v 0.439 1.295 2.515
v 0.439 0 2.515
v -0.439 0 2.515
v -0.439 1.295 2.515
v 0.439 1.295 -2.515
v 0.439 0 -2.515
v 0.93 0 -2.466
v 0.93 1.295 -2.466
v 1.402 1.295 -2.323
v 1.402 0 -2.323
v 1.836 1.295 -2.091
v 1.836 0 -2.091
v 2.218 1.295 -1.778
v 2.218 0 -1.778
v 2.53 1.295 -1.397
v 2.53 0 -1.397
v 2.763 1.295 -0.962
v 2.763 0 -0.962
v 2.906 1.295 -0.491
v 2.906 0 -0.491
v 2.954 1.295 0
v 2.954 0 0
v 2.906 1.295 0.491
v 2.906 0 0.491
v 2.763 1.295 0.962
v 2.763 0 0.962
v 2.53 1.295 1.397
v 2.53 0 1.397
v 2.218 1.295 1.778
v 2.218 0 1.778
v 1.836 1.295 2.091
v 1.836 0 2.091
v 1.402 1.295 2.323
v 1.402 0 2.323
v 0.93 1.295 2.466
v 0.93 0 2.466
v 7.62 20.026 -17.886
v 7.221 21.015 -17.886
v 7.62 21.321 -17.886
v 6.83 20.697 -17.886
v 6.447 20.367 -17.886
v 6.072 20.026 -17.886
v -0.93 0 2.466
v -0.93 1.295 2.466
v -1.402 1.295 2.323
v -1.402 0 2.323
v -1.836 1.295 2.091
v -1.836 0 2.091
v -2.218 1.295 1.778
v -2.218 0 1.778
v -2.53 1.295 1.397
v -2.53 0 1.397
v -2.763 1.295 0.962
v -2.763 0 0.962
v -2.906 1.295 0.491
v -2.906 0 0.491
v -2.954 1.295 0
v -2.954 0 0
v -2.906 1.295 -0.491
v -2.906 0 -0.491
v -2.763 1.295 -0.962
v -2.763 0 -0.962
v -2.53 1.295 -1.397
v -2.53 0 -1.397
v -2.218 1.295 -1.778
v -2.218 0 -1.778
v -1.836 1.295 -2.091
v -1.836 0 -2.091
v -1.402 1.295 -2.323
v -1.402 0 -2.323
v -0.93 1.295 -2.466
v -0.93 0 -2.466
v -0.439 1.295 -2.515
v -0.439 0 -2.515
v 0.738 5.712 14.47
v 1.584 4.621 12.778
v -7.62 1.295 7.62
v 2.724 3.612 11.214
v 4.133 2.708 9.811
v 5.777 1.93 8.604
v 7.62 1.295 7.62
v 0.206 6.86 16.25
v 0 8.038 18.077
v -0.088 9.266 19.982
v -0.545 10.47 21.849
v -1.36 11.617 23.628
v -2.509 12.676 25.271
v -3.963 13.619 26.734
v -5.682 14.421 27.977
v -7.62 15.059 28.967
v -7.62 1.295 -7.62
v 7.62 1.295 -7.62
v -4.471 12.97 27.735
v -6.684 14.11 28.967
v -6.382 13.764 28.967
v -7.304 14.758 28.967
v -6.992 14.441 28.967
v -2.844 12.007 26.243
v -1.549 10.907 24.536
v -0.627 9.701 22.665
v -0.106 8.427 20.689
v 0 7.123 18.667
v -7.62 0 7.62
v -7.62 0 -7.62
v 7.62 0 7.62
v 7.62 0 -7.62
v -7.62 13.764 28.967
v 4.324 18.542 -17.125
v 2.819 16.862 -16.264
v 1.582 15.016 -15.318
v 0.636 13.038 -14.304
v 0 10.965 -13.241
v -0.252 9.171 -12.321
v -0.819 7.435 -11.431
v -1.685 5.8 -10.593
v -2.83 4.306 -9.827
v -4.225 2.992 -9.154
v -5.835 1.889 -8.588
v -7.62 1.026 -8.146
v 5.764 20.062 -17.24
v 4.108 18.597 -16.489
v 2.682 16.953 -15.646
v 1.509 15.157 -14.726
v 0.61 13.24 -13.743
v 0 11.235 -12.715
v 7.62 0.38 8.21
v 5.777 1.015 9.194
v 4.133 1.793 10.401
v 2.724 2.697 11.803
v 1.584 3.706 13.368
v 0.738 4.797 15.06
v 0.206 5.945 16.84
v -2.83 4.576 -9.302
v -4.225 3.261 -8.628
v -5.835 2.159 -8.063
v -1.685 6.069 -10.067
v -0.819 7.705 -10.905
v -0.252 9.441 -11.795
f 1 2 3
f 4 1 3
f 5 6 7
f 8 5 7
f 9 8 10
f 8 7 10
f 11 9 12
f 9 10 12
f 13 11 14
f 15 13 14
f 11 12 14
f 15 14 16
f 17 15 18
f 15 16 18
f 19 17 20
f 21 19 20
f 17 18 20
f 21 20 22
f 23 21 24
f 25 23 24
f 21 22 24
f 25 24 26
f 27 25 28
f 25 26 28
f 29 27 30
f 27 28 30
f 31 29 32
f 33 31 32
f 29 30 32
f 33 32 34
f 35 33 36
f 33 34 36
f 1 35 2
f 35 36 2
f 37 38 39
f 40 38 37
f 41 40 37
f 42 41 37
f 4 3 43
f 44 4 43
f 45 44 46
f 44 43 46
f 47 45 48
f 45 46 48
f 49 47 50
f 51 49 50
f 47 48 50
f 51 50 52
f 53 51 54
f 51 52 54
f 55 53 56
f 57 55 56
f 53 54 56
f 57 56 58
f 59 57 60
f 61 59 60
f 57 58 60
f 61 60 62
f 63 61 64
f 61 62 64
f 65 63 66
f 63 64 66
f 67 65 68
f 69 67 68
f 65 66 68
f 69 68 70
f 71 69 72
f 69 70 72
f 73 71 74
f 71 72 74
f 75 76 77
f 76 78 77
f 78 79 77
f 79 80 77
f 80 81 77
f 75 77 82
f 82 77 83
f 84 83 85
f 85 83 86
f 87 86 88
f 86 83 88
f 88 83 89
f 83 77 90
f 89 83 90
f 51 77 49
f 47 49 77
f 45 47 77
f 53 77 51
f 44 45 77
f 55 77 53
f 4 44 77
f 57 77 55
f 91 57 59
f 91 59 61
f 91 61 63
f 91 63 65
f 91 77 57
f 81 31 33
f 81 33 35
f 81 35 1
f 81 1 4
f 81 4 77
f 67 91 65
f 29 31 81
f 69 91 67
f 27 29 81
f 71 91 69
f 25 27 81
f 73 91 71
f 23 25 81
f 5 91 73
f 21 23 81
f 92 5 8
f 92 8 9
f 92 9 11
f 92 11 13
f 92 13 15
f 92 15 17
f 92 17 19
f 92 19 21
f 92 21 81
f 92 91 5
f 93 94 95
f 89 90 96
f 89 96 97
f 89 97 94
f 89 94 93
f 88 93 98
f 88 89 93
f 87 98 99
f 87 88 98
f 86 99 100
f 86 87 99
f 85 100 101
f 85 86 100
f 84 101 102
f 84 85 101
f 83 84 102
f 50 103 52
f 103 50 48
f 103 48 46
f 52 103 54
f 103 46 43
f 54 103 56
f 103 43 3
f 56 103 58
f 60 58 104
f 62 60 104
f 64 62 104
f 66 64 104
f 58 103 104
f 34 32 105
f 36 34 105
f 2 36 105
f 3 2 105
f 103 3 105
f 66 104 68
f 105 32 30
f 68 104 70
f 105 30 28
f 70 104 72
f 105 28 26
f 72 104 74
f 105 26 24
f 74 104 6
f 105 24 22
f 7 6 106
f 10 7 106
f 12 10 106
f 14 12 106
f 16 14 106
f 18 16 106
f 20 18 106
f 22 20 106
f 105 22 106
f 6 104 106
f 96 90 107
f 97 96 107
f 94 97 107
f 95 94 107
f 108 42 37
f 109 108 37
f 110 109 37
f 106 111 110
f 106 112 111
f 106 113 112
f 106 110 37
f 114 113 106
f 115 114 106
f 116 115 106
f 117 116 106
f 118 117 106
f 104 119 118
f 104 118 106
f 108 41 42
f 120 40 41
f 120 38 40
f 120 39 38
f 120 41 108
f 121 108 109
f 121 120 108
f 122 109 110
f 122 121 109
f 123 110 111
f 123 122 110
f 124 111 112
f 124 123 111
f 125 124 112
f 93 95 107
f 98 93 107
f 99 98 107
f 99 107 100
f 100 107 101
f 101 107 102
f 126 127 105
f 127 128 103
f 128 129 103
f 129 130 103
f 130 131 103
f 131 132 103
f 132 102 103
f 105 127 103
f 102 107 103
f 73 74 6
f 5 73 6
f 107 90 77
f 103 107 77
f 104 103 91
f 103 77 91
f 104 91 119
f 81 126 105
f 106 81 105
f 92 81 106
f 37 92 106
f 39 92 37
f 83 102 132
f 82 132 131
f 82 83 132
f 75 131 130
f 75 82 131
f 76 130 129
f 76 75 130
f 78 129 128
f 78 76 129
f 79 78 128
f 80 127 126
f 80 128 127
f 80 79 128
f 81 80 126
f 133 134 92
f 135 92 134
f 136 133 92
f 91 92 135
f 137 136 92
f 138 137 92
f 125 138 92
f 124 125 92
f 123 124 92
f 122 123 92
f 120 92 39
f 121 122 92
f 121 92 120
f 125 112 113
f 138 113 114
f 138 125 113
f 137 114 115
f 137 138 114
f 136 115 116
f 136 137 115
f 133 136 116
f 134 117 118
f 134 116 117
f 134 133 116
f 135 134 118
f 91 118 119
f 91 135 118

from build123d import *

# Parameters (mm, degrees)
SKETCH1_W           = 15.24
SKETCH1_H           = 15.24
BOSS_EXTRUDE1_DEPTH = 1.2954
BOSS_EXTRUDE2_DEPTH = 15.24
CUT_EXTRUDE1_DEPTH  = 15.24
CUT_EXTRUDE2_DEPTH  = 15.24


with BuildPart() as part:
    # Sketch1 → Boss-Extrude1 (new body)
    with BuildSketch(Plane(origin=(0, 0, 0), x_dir=(1, 0, 0), z_dir=(0, 1, 0))):
        Rectangle(SKETCH1_W, SKETCH1_H)
        with BuildLine():
            Line((-0.43942, 2.5146), (0.43942, 2.5146))
            ThreePointArc((0.43942, 2.5146), (2.95402, 0), (0.43942, -2.5146))
            Line((0.43942, -2.5146), (-0.43942, -2.5146))
            ThreePointArc((-0.43942, -2.5146), (-2.95402, 0), (-0.43942, 2.5146))
        make_face(mode=Mode.SUBTRACT)
    extrude(amount=BOSS_EXTRUDE1_DEPTH)

    # Sketch3 → Boss-Extrude2 (add)
    with BuildSketch(Plane.ZY.offset(7.62)):
        Polygon((7.62, 1.2954), (28.967378653, 15.059462796), (28.967378653, 13.764062796), (7.62, 0), align=None)
        Polygon((-7.62, 1.2954), (-17.885578899, 21.321091109), (-17.885578899, 20.025691109), (-7.62, 0), align=None)
    extrude(amount=-BOSS_EXTRUDE2_DEPTH)

    # Sketch4 → Cut-Extrude1 (cut)
    with BuildSketch(Plane(origin=(0, -2.555384203, 1.647624714), x_dir=(1, 0, 0), z_dir=(0, 0.840447978, -0.541892236))):
        with BuildLine():
            Line((7.62, -7.106180798), (7.62, -32.506180798))
            Line((7.62, -32.506180798), (-7.62, -32.506180798))
            ThreePointArc((-7.62, -32.506180798), (-1.894391171, -27.153773172), (0, -19.548370753))
            ThreePointArc((0, -19.548370753), (2.118358532, -12.291259766), (7.62, -7.106180798))
        make_face()
    extrude(amount=-CUT_EXTRUDE1_DEPTH, mode=Mode.SUBTRACT)

    # Sketch5 → Cut-Extrude2 (cut)
    with BuildSketch(Plane(origin=(0, -2.823741084, -5.508444021), x_dir=(1, 0, 0), z_dir=(0, 0.456175683, 0.889889738))):
        with BuildLine():
            Line((-7.62, 4.628821871), (-7.62, 27.132386357))
            Line((-7.62, 27.132386357), (7.62, 27.132386357))
            ThreePointArc((7.62, 27.132386357), (2.681671235, 22.223683301), (0, 15.797868484))
            ThreePointArc((0, 15.797868484), (-2.22452861, 9.131668969), (-7.62, 4.628821871))
        make_face()
    extrude(amount=-CUT_EXTRUDE2_DEPTH, mode=Mode.SUBTRACT)


solid = part.part
